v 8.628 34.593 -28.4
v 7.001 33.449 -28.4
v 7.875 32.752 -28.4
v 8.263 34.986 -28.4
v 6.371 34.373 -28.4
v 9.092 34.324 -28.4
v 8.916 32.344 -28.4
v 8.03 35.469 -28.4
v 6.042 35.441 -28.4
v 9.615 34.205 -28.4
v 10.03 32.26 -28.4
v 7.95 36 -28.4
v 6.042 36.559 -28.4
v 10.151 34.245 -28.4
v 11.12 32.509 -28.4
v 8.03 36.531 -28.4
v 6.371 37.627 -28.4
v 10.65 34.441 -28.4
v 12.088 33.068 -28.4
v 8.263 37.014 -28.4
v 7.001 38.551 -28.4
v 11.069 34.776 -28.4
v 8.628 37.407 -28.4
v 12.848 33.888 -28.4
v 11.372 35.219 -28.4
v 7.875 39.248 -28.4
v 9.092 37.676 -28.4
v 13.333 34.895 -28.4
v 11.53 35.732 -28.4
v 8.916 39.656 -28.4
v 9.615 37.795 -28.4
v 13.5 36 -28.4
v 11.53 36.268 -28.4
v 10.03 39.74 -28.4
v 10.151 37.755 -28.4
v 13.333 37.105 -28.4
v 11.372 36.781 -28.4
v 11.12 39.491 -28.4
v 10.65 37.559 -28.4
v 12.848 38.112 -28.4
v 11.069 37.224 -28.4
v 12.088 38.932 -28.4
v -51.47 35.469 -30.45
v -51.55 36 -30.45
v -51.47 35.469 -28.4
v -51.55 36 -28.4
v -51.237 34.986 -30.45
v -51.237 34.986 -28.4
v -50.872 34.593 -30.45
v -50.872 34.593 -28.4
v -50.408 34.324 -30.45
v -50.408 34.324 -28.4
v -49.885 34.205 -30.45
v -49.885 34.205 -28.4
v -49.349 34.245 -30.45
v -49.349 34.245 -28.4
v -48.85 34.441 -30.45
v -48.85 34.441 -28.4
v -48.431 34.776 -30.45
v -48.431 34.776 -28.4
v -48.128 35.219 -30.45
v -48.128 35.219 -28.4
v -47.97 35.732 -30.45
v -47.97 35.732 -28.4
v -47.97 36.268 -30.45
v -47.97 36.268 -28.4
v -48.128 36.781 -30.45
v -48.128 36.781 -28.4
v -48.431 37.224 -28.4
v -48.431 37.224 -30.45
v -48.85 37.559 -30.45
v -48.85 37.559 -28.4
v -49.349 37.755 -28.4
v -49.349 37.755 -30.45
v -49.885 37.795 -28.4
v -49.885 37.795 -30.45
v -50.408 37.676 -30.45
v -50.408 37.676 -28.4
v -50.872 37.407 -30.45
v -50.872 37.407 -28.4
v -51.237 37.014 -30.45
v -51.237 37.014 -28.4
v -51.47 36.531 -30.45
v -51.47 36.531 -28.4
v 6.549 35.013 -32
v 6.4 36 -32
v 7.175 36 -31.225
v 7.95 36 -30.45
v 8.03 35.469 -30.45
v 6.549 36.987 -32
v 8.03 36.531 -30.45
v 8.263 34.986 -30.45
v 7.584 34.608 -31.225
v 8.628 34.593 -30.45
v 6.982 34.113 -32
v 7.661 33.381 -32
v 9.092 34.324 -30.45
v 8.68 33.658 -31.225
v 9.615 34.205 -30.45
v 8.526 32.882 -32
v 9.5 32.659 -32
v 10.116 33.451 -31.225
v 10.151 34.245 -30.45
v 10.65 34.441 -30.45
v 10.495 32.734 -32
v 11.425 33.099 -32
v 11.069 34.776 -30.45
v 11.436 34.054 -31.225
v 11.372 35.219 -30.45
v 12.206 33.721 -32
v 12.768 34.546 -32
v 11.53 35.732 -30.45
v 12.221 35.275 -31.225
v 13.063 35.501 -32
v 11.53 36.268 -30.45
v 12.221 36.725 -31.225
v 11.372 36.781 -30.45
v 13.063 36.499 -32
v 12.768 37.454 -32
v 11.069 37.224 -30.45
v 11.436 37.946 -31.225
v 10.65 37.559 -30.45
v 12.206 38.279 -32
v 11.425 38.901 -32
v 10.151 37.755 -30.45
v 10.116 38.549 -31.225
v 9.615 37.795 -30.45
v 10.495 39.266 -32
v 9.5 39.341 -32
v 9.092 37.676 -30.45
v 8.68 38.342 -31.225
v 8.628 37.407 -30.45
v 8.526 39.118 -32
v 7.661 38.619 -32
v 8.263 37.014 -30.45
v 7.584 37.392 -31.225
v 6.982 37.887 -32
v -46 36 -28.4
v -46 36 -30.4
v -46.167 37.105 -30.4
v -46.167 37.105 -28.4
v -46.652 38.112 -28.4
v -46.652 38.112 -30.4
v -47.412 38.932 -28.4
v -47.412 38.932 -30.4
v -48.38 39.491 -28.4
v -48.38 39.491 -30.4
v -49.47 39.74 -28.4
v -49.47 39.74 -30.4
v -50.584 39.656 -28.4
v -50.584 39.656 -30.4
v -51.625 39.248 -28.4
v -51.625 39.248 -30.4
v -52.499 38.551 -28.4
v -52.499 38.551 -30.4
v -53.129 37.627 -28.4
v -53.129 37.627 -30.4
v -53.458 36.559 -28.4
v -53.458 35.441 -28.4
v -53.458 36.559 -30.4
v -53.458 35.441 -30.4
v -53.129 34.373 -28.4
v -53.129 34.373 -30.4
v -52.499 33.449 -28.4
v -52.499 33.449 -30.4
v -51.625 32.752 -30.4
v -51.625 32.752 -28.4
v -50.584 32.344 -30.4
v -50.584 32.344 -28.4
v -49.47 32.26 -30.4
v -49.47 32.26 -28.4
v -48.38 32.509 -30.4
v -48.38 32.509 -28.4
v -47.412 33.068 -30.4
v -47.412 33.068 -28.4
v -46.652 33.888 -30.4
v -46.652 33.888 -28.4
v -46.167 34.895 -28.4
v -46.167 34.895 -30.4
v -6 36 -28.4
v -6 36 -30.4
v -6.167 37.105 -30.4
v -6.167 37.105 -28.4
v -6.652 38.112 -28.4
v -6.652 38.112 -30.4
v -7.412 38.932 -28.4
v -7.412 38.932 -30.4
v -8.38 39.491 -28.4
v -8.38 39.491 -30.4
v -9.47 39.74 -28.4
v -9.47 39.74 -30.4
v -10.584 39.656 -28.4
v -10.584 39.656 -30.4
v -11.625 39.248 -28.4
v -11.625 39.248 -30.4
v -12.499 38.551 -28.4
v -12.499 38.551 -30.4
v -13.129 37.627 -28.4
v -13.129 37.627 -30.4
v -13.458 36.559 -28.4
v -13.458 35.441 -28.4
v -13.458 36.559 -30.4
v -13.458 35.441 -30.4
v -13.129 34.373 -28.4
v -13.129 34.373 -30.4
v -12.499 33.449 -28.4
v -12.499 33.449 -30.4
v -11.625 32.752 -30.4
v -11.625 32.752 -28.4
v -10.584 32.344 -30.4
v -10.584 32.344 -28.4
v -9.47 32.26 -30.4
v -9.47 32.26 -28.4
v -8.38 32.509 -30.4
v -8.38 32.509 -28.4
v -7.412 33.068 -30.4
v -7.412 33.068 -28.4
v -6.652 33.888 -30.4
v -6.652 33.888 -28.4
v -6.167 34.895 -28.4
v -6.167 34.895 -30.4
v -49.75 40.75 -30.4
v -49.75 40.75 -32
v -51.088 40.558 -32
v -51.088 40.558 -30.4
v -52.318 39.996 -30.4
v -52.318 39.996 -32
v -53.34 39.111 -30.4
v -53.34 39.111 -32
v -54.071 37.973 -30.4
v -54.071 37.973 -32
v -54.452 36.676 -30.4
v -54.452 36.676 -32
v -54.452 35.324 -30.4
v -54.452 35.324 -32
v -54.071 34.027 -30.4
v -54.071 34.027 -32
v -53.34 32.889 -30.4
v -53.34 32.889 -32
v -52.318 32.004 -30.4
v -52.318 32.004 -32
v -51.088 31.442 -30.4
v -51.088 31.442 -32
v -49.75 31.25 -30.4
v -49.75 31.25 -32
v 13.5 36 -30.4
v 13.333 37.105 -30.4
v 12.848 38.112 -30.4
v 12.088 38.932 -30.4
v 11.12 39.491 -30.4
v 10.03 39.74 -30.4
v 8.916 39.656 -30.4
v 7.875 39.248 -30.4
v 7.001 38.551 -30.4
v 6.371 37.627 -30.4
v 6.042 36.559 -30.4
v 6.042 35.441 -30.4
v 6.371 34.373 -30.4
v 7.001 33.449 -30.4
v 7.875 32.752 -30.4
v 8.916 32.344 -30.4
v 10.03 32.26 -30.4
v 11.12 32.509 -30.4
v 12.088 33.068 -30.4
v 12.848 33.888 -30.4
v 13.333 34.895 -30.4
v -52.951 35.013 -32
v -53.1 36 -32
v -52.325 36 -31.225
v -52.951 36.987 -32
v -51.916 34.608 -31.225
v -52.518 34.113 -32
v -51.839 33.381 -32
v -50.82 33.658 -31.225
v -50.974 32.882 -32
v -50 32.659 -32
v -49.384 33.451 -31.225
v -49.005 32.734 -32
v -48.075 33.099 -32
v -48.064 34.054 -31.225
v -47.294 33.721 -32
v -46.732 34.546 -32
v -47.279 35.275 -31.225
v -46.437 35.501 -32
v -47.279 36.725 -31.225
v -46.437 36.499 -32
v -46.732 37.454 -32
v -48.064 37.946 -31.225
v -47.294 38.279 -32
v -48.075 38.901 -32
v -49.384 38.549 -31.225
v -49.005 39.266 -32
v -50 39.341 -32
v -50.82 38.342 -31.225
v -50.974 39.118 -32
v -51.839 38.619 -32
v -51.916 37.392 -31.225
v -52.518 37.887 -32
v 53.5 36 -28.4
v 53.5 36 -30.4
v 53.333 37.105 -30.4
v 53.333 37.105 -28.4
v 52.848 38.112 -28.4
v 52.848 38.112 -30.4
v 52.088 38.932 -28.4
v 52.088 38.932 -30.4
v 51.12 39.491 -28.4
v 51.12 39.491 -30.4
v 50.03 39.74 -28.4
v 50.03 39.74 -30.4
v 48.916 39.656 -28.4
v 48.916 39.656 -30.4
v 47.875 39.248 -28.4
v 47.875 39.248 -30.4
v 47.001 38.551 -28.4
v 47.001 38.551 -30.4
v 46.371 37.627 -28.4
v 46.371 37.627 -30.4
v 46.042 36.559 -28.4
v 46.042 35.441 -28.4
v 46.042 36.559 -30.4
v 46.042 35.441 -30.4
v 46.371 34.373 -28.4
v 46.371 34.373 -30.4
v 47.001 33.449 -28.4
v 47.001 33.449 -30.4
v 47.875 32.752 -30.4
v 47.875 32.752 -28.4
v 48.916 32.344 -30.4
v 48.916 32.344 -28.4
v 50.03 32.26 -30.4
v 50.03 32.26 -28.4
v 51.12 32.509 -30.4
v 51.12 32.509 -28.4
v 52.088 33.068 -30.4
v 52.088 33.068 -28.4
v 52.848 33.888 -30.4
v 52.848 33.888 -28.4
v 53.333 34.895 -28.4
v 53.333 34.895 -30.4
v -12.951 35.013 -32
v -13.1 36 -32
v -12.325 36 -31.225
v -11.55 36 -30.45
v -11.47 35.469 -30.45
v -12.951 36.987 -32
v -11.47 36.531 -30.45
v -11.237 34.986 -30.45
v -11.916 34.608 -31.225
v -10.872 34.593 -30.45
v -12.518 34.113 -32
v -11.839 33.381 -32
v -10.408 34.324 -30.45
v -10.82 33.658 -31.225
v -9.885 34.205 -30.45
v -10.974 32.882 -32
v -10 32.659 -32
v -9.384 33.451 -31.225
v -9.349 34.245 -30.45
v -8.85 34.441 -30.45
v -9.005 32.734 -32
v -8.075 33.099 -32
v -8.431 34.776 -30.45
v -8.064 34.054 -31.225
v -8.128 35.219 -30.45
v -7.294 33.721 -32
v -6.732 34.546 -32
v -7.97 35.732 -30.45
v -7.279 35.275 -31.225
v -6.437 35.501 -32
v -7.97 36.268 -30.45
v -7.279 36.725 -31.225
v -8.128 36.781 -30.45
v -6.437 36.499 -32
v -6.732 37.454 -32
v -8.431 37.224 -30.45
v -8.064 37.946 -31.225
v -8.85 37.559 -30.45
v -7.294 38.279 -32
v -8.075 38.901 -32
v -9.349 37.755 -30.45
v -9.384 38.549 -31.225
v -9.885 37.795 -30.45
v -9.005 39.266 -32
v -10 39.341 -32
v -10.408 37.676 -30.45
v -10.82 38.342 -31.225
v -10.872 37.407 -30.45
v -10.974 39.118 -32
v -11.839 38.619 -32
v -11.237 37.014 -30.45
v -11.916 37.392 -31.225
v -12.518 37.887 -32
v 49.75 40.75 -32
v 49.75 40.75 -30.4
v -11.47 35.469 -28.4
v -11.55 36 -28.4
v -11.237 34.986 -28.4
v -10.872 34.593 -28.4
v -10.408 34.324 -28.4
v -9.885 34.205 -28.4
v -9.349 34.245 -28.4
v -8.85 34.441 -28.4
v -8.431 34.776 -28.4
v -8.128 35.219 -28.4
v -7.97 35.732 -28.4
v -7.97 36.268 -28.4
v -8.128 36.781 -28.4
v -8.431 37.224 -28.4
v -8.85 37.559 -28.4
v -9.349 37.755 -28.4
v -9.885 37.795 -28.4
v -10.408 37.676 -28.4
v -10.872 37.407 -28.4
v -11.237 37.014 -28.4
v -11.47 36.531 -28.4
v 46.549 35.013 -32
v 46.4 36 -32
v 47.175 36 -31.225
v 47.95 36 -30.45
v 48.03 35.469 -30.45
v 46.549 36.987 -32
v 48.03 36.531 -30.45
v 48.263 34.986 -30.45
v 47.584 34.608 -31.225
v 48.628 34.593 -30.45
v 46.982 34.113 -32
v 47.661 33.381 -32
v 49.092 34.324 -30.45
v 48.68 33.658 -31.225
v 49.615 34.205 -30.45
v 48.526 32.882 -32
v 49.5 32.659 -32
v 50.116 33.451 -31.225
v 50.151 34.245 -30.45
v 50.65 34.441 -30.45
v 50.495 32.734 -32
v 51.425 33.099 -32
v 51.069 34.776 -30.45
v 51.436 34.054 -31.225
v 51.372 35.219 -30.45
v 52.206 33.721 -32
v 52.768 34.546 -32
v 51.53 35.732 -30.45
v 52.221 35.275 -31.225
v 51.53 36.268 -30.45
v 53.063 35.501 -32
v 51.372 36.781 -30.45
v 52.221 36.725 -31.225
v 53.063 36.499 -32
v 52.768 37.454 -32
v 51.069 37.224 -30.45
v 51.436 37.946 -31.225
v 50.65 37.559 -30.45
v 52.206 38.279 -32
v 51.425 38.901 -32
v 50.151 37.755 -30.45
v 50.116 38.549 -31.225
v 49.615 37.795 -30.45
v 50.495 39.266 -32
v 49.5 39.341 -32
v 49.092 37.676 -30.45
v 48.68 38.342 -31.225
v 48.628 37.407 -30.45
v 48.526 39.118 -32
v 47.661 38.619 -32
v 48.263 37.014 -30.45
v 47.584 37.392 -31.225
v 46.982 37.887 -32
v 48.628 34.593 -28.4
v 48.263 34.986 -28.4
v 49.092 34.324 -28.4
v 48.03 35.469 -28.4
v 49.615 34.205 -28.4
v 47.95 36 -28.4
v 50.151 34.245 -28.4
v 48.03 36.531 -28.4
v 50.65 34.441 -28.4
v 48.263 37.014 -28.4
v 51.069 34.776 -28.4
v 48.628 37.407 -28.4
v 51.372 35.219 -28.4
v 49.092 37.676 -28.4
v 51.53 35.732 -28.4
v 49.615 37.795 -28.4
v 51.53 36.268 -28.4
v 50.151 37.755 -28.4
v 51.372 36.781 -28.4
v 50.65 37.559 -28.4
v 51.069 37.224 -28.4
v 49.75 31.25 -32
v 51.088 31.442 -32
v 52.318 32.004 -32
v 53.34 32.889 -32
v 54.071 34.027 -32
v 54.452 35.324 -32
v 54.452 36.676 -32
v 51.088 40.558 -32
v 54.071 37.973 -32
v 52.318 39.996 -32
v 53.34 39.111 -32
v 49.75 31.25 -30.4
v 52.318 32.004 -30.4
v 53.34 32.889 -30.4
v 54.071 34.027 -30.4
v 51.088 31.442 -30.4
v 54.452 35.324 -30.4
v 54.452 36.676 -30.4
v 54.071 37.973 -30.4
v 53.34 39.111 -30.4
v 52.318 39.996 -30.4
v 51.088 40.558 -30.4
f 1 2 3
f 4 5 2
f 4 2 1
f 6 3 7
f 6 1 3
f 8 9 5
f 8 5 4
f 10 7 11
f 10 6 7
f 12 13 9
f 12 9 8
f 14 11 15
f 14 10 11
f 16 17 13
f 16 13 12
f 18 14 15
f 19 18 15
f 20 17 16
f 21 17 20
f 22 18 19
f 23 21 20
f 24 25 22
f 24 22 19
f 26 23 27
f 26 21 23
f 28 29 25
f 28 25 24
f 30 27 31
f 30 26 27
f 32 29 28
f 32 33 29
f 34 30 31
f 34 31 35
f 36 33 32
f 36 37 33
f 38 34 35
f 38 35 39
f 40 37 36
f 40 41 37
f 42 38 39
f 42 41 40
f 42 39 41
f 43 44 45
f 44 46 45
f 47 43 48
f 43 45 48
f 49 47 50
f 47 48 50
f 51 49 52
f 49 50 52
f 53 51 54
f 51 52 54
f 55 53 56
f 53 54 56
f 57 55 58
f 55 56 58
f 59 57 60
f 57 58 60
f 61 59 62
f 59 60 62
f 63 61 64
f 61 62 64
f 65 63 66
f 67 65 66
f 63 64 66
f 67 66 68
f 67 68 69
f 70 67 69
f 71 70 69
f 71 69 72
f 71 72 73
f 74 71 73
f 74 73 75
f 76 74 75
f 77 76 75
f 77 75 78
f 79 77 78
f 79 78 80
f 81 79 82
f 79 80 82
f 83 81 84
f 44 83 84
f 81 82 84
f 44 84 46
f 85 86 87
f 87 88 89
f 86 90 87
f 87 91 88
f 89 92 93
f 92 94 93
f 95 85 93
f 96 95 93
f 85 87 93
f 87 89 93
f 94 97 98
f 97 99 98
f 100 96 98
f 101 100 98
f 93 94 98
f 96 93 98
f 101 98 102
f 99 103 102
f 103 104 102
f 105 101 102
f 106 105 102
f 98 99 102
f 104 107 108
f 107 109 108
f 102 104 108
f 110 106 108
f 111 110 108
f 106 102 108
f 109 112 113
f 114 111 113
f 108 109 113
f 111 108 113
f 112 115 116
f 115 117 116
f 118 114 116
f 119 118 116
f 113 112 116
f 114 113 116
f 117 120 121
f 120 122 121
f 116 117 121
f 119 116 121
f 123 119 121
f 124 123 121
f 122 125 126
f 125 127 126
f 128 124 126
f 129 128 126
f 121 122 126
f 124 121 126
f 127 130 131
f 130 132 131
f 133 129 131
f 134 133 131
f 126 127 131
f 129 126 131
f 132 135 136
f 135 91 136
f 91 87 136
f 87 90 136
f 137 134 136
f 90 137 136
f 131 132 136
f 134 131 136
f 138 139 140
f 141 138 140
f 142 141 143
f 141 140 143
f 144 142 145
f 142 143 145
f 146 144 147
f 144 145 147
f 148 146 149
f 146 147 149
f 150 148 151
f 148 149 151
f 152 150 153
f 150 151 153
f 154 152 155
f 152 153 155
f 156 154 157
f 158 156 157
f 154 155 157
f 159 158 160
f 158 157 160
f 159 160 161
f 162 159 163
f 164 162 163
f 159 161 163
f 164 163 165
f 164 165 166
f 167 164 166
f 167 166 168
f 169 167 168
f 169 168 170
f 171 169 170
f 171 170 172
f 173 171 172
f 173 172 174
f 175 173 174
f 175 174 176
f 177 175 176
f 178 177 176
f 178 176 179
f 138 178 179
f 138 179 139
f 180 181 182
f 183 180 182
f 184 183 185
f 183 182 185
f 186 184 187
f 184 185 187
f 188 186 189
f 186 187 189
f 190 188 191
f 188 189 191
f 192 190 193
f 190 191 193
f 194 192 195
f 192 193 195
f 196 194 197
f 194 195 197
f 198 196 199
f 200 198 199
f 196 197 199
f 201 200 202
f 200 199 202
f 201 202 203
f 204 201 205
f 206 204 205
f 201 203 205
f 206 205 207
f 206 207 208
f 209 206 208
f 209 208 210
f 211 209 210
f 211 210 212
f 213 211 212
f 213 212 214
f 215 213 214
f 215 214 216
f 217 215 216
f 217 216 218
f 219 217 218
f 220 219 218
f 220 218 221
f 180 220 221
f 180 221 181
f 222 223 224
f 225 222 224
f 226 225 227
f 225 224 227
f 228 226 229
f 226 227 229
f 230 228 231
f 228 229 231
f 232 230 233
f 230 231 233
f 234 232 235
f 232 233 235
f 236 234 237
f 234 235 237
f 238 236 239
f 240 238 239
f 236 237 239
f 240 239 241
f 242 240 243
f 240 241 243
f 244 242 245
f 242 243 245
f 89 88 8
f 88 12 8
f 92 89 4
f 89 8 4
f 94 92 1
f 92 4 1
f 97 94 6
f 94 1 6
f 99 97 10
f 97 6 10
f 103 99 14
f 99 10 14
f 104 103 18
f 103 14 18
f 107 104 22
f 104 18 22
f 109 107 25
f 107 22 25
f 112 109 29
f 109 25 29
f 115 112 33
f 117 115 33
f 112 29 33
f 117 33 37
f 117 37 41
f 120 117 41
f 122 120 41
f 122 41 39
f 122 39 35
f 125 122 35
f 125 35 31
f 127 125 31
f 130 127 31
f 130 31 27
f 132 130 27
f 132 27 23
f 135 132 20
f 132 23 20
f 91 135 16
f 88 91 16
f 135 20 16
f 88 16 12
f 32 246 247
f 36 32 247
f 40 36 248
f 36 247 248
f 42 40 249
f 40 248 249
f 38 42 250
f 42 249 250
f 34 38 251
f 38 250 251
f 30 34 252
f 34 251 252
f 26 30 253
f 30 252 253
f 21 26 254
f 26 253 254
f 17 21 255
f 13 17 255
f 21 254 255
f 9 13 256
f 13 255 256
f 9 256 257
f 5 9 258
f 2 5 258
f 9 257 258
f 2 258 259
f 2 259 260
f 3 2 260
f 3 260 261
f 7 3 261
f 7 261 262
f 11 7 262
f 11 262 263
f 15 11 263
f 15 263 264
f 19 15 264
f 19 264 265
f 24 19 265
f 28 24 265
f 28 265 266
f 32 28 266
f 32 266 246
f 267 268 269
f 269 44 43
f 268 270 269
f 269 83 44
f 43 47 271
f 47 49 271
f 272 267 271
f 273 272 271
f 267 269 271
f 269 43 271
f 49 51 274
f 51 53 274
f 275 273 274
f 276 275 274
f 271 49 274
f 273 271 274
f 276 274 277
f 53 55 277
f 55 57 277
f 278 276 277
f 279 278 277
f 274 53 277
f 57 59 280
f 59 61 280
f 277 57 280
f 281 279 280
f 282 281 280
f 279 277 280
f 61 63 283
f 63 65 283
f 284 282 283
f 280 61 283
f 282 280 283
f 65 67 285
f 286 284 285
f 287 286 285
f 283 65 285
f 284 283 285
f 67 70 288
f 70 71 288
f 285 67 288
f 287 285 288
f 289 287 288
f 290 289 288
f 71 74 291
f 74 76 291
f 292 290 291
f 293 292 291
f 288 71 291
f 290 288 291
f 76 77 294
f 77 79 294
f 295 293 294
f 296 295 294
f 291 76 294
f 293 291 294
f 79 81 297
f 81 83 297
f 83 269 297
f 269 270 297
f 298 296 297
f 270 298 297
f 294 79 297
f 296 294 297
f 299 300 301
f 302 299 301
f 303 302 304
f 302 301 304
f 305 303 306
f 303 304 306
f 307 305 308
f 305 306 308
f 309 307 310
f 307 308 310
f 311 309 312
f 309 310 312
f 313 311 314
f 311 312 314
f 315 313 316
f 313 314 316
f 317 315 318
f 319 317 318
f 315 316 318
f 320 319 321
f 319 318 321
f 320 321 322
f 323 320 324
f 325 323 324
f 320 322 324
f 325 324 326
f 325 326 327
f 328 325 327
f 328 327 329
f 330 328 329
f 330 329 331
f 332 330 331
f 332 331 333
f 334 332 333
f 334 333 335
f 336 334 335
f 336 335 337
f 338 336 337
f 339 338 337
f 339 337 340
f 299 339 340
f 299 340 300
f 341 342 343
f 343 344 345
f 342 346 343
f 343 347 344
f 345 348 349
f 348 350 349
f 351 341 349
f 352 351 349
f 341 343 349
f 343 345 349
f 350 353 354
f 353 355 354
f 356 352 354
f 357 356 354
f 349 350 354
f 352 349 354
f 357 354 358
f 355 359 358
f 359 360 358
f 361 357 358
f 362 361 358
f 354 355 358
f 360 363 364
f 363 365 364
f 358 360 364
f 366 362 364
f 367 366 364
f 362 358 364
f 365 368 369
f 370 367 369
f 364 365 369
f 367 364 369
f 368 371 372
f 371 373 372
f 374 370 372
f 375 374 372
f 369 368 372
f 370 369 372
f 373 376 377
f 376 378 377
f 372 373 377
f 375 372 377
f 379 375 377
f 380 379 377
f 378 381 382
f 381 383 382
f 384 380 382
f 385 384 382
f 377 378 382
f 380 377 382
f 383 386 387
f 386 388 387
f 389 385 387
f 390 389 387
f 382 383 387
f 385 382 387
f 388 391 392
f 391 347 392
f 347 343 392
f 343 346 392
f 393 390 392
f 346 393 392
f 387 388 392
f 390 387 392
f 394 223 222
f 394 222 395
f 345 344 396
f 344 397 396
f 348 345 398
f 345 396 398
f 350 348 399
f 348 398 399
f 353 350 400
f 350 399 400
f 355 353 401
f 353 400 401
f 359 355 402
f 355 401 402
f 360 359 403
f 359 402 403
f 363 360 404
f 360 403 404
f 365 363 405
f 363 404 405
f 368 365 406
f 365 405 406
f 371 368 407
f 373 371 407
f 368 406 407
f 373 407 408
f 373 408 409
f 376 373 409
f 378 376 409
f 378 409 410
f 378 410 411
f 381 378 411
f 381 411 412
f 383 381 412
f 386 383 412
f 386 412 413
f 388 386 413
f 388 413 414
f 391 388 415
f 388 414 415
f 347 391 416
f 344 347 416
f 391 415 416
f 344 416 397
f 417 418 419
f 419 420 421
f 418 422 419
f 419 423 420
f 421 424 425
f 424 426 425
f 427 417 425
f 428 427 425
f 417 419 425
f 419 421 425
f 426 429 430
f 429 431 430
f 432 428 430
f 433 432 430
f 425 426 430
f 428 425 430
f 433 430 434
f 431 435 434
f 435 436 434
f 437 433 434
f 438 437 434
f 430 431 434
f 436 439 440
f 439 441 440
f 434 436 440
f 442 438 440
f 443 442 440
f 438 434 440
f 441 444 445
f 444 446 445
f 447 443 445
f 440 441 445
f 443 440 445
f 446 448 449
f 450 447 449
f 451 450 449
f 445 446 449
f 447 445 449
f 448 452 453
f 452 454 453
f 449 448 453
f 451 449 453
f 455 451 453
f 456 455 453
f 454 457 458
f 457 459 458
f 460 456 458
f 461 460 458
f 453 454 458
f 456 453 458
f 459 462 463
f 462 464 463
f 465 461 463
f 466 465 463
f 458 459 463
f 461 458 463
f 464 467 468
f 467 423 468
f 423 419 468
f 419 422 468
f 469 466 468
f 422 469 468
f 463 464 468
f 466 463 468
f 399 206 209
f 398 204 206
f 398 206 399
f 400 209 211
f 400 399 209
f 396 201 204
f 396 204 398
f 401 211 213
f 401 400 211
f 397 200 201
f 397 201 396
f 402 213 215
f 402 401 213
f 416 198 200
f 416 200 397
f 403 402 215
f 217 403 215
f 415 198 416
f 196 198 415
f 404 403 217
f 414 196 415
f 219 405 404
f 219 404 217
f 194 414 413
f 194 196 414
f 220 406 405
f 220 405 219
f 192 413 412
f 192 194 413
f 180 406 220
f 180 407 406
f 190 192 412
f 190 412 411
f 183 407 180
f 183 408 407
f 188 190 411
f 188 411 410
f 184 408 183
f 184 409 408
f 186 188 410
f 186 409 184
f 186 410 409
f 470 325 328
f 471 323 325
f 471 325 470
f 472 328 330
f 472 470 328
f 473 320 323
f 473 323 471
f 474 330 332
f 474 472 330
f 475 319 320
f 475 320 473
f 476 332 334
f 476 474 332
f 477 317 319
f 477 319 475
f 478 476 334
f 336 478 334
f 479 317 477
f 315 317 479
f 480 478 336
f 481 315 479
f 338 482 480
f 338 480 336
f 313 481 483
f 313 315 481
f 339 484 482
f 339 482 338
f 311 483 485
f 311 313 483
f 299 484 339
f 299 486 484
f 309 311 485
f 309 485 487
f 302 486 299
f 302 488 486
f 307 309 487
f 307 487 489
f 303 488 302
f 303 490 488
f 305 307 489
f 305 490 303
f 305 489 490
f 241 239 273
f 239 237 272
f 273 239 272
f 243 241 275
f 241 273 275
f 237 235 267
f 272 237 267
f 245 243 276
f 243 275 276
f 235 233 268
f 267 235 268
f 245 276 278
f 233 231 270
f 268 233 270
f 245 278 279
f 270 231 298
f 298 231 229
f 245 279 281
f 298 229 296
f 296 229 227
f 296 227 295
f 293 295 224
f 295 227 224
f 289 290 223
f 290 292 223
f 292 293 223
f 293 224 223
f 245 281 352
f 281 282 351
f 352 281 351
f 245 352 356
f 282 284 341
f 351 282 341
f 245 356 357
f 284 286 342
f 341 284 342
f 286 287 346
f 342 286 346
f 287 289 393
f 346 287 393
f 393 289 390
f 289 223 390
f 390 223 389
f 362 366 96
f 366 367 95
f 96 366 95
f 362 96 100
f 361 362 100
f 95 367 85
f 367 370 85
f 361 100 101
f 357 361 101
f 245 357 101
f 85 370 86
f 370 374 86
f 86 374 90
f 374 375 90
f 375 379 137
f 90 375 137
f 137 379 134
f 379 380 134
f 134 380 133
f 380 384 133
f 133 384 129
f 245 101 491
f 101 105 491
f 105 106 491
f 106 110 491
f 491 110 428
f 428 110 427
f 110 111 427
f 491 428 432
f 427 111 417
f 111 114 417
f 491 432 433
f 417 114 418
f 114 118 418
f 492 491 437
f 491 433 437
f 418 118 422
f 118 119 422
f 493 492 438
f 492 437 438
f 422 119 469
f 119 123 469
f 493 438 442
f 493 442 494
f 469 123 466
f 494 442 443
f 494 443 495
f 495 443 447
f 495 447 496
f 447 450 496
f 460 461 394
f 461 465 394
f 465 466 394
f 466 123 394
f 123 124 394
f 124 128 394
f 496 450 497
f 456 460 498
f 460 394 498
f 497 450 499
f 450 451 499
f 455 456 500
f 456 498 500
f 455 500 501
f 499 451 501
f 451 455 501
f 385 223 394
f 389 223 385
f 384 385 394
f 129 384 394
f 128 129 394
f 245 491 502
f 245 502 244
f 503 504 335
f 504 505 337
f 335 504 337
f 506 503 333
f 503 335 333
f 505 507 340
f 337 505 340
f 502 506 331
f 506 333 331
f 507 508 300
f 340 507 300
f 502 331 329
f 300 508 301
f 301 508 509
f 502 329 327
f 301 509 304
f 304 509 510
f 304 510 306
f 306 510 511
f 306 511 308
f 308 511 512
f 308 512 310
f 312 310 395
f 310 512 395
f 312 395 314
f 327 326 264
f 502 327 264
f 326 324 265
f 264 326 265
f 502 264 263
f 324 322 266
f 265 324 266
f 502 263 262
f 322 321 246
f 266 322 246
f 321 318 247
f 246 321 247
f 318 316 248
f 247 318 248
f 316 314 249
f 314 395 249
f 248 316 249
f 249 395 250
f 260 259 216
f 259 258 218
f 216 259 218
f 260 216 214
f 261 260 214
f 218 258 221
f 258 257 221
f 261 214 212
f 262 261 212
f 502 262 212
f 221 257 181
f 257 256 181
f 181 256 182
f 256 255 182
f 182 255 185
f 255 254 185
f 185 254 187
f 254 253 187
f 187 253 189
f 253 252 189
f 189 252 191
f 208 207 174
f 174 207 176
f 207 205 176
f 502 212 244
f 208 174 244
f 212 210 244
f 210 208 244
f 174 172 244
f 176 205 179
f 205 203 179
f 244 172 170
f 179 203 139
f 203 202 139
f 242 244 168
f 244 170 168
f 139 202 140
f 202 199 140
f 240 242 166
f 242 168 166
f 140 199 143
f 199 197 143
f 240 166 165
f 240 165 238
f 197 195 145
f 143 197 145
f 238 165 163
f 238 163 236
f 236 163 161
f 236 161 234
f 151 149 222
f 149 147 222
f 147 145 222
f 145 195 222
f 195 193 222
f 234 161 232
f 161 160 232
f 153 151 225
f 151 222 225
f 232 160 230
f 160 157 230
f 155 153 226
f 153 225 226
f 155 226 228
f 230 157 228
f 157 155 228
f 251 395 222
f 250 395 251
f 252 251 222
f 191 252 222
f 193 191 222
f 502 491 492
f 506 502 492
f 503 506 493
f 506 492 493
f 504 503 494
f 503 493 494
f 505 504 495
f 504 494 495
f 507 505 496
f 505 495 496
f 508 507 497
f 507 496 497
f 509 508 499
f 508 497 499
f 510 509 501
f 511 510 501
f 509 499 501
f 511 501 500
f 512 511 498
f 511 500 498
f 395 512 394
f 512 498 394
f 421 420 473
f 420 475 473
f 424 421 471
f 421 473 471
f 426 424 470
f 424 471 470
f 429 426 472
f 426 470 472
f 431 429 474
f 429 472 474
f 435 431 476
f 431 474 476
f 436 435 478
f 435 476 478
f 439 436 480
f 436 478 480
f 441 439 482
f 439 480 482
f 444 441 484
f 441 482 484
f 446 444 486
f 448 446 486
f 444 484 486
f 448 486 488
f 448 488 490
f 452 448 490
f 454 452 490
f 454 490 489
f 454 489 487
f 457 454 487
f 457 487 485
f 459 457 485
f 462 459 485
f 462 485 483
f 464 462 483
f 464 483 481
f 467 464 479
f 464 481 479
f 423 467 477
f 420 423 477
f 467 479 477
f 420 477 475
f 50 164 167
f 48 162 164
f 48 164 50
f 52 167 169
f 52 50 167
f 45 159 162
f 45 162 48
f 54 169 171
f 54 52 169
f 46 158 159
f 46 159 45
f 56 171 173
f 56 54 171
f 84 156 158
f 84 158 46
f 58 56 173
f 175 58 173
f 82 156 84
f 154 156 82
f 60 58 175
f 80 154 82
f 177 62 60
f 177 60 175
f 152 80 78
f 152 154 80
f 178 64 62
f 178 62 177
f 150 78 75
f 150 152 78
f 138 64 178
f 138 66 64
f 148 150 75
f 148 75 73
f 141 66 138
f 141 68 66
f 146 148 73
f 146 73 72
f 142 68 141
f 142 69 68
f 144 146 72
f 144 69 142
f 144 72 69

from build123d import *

# Parameters (mm, degrees)
PAD003_DEPTH        = 1.6
SKETCH006_R         = 3.75
PAD004_DEPTH        = 3.6
HOLE001_D           = 3.6
HOLE001_DEPTH       = 25
HOLE001_CSINK_D     = 6.7
HOLE001_CSINK_ANGLE = 90


with BuildPart() as part:
    # Sketch005 → Pad003 (new body)
    with BuildSketch(Plane.XY):
        with BuildLine():
            Line((-49.75, 4.75), (49.75, 4.75))
            ThreePointArc((49.75, -4.75), (54.5, 0), (49.75, 4.75))
            Line((49.75, -4.75), (-49.75, -4.75))
            ThreePointArc((-49.75, 4.75), (-54.5, 0), (-49.75, -4.75))
        make_face()
    extrude(amount=PAD003_DEPTH)

    # Sketch006 → Pad004 (join)
    with BuildSketch(Plane.XY):
        with Locations((-49.75, 0)):
            Circle(SKETCH006_R)
        with Locations((-9.75, 0)):
            Circle(SKETCH006_R)
        with Locations((9.75, 0)):
            Circle(SKETCH006_R)
        with Locations((49.75, 0)):
            Circle(SKETCH006_R)
    extrude(amount=PAD004_DEPTH)

    # Hole001
    with Locations(Plane(origin=(0, 0, 0), x_dir=(1, 0, 0), z_dir=(0, 0, -1))):
        with Locations((-49.75, 0), (-9.75, 0), (9.75, 0), (49.75, 0)):
            CounterSinkHole(HOLE001_D / 2, HOLE001_CSINK_D / 2, depth=HOLE001_DEPTH, counter_sink_angle=HOLE001_CSINK_ANGLE)


with BuildPart() as part_1:
    # Body001 placement: moved
    add(part.part.moved(Location((0, 36, -32))))


solid = part_1.part
